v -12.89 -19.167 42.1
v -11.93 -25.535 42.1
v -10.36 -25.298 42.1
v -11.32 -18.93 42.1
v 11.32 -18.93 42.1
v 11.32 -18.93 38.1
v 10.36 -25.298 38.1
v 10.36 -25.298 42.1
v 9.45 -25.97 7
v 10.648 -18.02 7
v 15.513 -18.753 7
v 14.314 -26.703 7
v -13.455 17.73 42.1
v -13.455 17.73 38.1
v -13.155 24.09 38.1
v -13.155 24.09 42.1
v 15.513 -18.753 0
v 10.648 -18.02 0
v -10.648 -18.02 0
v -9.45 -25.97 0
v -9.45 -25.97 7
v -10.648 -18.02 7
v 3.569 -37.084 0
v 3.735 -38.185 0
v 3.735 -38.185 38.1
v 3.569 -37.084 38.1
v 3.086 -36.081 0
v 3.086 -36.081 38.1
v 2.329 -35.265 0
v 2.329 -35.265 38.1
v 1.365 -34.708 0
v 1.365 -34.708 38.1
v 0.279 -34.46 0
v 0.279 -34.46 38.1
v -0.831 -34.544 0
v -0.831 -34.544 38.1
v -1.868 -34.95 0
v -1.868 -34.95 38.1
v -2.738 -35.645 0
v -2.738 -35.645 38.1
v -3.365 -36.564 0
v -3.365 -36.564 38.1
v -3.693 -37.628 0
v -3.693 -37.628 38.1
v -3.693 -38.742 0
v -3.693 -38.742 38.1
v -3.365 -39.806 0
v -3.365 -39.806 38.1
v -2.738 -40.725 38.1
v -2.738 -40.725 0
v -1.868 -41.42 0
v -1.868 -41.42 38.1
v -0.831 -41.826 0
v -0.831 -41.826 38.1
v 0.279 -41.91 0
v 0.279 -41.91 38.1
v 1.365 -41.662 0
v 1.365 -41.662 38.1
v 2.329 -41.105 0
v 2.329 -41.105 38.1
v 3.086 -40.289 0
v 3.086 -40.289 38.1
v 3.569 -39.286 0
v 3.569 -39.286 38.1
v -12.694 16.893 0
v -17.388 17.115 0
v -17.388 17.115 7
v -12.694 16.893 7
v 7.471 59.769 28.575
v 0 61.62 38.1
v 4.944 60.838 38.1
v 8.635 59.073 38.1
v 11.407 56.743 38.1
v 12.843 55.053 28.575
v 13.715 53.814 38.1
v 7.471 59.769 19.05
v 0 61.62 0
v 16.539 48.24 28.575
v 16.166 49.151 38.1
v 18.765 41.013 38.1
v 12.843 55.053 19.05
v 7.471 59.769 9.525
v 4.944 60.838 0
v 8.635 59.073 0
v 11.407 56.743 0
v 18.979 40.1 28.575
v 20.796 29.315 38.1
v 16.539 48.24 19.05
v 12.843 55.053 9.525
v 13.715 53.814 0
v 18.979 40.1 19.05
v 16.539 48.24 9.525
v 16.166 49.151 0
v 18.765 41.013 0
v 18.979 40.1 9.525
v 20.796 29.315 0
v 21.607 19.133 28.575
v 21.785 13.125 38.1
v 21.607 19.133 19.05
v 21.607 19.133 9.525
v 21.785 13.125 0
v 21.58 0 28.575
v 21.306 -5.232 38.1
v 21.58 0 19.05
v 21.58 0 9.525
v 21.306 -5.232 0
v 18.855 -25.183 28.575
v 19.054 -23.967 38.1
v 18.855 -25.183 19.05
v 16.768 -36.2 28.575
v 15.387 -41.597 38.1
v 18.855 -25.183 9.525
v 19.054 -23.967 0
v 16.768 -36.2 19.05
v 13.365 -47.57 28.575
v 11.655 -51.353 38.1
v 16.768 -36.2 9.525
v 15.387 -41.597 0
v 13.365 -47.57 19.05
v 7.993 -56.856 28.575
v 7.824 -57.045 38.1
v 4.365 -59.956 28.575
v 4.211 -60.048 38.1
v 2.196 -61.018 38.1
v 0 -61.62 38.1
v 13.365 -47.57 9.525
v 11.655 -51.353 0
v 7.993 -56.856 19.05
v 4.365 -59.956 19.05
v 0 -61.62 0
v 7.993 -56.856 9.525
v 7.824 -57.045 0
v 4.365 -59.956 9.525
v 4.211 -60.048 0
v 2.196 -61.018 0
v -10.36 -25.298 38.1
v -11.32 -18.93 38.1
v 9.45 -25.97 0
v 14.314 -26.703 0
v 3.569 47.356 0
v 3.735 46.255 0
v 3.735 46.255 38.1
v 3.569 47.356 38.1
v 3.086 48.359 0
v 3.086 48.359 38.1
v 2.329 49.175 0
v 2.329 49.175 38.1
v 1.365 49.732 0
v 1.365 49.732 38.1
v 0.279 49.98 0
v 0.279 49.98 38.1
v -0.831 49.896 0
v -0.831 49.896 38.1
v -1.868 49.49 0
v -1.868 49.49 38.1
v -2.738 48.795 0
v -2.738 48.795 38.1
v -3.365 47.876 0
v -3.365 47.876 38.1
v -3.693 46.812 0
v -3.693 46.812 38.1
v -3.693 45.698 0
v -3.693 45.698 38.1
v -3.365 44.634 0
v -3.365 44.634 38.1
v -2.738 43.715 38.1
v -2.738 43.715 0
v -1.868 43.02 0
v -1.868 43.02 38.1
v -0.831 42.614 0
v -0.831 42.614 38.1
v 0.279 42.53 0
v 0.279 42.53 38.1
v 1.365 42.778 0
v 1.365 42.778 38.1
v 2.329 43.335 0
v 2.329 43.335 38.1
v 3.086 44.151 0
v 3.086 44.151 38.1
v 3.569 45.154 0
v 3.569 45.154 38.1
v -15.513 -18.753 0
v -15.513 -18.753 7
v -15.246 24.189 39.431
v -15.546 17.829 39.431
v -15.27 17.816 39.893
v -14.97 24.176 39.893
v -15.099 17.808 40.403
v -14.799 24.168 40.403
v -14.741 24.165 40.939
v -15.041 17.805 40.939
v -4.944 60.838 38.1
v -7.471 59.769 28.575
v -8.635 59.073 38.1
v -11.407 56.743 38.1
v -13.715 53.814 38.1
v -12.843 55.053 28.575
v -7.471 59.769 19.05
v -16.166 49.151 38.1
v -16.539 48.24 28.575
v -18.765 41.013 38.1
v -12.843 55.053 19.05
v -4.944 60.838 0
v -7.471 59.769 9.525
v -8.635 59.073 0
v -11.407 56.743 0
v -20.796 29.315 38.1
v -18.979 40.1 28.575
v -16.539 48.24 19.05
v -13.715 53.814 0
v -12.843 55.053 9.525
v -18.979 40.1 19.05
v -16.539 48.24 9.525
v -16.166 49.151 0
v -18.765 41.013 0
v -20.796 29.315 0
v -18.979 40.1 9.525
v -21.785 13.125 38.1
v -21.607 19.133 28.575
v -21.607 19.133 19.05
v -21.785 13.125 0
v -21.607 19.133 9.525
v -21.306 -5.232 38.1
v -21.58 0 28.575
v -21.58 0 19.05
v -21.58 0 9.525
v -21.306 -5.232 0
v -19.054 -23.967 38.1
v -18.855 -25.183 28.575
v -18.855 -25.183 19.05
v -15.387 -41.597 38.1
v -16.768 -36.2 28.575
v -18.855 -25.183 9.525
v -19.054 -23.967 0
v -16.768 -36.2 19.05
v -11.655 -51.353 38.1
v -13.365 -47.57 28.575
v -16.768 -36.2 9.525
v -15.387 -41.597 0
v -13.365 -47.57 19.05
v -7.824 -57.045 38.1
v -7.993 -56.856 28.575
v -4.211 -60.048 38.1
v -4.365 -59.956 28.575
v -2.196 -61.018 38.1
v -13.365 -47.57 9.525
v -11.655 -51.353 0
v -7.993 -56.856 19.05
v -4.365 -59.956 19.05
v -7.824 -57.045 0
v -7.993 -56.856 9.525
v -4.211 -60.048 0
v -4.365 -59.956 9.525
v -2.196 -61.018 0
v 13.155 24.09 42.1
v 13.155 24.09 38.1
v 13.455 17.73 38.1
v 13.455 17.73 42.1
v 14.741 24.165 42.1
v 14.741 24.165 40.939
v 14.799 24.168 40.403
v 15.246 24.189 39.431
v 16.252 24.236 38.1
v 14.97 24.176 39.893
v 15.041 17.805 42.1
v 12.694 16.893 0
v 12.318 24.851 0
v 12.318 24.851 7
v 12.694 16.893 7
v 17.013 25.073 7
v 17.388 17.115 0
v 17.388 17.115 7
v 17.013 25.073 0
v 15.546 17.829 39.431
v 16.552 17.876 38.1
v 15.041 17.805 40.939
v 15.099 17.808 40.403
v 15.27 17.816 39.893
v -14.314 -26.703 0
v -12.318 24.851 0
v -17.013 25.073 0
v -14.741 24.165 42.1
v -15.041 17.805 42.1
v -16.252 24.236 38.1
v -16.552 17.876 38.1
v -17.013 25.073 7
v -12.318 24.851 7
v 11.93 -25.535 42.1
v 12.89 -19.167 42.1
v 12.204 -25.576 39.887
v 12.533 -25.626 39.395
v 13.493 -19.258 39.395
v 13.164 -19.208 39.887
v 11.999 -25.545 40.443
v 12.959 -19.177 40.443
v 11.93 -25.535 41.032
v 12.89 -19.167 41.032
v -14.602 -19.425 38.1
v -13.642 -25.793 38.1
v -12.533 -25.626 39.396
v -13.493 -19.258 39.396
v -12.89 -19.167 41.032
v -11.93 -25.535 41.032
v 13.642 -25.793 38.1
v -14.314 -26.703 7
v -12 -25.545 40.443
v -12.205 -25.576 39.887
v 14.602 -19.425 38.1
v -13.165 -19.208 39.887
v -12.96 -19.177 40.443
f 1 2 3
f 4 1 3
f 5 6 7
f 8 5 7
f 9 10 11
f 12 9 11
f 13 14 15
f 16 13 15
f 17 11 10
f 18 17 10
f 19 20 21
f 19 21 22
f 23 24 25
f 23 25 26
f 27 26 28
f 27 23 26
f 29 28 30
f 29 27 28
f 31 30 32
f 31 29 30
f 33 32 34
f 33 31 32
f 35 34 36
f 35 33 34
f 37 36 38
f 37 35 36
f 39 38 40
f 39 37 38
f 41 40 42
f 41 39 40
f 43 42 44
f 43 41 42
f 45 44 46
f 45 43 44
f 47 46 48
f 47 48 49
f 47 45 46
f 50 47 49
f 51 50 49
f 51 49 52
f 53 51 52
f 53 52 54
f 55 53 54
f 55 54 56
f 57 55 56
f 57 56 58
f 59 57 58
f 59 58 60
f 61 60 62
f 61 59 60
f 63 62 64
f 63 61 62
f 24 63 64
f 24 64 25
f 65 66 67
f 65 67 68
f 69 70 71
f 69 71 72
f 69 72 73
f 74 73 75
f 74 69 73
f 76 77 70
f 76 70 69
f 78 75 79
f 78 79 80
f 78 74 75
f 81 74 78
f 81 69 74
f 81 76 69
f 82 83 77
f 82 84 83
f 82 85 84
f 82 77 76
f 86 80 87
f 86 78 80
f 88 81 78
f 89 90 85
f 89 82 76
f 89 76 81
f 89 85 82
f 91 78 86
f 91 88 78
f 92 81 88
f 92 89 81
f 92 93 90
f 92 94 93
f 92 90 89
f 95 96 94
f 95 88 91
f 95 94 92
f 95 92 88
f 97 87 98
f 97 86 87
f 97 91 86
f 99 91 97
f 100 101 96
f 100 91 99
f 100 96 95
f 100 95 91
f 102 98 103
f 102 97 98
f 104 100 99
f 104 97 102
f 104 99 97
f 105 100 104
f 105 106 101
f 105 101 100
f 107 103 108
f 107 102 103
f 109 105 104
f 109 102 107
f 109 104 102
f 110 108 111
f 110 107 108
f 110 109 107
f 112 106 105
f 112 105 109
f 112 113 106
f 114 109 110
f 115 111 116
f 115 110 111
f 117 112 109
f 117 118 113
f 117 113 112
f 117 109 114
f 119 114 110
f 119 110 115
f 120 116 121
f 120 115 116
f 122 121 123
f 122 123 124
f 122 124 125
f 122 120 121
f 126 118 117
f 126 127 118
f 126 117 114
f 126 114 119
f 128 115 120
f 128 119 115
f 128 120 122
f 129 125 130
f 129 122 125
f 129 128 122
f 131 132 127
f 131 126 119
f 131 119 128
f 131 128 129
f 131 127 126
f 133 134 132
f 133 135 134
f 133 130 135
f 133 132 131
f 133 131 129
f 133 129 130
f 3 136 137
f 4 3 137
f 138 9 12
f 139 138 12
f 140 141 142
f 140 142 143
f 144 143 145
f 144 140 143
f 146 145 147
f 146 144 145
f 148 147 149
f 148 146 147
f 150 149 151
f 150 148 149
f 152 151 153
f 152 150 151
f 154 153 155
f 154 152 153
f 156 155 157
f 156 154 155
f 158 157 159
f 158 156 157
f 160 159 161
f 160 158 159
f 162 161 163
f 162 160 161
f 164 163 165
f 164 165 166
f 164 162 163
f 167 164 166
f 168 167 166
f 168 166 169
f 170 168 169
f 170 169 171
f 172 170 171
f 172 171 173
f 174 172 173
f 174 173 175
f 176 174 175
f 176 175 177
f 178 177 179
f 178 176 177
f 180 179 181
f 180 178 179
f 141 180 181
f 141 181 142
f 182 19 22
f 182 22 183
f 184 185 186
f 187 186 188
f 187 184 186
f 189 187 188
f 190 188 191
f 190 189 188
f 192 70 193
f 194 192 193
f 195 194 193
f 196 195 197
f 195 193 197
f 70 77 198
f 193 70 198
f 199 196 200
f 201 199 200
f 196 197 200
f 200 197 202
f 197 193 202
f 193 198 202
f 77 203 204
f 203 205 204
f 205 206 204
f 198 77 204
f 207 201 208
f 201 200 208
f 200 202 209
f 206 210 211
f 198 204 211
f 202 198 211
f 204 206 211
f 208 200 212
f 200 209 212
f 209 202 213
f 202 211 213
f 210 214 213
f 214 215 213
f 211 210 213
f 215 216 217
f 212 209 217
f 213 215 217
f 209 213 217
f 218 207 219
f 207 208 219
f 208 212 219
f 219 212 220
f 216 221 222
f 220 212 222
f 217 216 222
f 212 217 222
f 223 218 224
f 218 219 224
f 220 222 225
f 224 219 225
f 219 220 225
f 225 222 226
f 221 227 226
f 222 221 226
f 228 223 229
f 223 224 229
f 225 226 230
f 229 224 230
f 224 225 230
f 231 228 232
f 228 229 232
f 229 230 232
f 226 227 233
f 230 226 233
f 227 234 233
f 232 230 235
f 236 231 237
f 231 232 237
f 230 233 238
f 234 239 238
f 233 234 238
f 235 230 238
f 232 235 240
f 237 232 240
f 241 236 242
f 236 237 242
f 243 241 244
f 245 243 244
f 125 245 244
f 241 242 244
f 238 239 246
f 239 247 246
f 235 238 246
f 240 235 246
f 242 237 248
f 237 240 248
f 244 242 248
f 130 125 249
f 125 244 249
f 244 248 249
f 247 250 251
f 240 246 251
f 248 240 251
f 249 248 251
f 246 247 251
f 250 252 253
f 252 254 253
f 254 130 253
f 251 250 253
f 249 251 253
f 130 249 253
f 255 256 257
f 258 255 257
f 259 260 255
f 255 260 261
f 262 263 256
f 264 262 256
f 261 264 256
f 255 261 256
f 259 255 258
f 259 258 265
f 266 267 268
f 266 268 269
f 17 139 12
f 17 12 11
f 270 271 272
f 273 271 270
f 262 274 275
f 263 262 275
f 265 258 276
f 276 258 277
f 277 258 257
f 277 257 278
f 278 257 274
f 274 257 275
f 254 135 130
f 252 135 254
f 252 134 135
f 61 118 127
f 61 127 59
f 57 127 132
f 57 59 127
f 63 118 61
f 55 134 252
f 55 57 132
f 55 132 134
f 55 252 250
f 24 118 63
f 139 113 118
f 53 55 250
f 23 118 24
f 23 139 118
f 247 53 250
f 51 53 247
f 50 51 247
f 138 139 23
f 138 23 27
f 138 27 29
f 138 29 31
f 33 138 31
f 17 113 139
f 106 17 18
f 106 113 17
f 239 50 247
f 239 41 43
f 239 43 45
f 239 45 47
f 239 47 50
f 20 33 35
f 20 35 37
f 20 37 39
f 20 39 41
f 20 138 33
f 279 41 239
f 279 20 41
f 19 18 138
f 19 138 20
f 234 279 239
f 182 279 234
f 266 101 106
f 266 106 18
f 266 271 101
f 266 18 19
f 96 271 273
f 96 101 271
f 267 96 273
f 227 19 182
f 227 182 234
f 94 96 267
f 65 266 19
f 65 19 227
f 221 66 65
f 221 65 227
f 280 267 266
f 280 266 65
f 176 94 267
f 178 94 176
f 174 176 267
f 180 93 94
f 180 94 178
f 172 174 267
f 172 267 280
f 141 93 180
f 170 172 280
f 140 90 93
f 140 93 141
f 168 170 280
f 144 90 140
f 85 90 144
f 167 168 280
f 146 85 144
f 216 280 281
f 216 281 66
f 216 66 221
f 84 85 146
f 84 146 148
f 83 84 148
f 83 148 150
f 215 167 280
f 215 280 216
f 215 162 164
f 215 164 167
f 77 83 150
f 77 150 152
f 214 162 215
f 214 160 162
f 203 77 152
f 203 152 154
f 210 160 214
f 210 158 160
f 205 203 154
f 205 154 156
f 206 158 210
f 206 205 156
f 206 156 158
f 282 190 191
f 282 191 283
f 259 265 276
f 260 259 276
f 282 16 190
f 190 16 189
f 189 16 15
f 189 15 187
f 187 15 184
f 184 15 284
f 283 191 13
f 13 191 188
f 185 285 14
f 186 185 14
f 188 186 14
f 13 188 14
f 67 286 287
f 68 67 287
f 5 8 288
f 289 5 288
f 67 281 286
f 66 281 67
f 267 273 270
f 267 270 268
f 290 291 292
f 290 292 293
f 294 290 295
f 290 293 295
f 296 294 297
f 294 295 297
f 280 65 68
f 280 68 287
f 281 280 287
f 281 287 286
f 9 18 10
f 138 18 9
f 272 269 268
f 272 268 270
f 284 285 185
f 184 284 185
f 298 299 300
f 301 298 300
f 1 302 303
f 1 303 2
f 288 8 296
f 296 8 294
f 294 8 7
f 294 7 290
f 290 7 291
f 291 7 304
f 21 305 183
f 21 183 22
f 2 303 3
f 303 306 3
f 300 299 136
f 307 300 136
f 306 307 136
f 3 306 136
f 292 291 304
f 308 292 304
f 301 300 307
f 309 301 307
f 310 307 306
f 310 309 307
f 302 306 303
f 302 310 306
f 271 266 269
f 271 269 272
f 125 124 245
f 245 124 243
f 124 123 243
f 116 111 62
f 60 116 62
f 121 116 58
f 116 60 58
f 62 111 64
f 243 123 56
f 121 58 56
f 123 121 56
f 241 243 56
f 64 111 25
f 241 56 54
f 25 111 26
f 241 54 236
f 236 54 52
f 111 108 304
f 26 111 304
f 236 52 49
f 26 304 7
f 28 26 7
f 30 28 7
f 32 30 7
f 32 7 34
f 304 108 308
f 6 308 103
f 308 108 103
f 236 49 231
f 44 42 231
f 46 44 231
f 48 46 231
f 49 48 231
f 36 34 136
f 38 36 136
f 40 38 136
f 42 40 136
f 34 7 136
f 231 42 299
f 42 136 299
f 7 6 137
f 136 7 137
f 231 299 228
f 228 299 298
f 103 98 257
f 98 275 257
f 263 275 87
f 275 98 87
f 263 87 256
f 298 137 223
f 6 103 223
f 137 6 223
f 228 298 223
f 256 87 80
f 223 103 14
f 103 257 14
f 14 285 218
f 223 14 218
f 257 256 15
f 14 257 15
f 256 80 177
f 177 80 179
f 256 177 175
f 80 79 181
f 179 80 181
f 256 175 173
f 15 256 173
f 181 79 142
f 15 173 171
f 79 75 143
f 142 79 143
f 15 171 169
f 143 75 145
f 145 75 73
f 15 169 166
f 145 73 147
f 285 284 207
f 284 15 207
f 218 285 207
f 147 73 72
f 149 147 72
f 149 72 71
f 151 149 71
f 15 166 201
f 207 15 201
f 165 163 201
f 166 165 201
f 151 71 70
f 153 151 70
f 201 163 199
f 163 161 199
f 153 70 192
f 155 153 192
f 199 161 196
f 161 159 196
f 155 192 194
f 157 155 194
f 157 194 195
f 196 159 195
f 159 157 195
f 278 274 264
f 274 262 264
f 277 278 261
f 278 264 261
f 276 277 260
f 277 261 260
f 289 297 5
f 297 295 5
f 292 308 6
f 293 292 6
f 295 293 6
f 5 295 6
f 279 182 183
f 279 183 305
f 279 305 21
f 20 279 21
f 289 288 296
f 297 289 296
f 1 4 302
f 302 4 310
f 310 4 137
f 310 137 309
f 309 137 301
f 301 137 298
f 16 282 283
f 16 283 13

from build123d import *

# Parameters (mm, degrees)
F1_R      = 3.735
F2_DEPTH  = 38.1
F4_DEPTH  = 4
F6_DEPTH  = 6.44
F8_DEPTH  = 6.3670715404
F10_DEPTH = 6.3670715404
F12_DEPTH = 6.44
F13_R     = 2.5
F14_DEPTH = 7


# Not quite as in the source:
# - a feature names something its author has since deleted; it is built from what else it names


with BuildPart() as f2:
    # F1 (on Top) → F2 (new body)
    with BuildSketch(Plane.XY):
        with BuildLine():
            add(Edge.make_bspline(
                [(0, 61.62), (11.5485272162, 61.4039385019), (22.0841192578, 39.7713639929), (22.0172478155, -1.3215032222), (19.7727052767, -22.1995102033), (12.6960353016, -59.3664700438), (0, -61.62)],
                knots=[0, 0, 0, 0, 0.2315513491, 0.5055689387, 0.7231235988, 1, 1, 1, 1], degree=3))
            add(Edge.make_bspline(
                [(0, 61.62), (-11.5485272162, 61.4039385019), (-22.0841192578, 39.7713639929), (-22.0172478155, -1.3215032222), (-19.7727052767, -22.1995102033), (-12.6960353016, -59.3664700438), (0, -61.62)],
                knots=[0, 0, 0, 0, 0.2315513491, 0.5055689387, 0.7231235988, 1, 1, 1, 1], degree=3))
        make_face()
        Polygon((-14.3142142012, -26.7031931663), (-15.512723518, -18.7530249028), (-10.6481931396, -18.0196838229), (-9.4496838229, -25.9698520863), align=None, mode=Mode.SUBTRACT)
        with Locations((0, -38.185)):
            Circle(F1_R, mode=Mode.SUBTRACT)
        Polygon((9.4496838229, -25.9698520863), (10.6481931396, -18.0196838229), (15.512723518, -18.7530249028), (14.3142142012, -26.7031931663), align=None, mode=Mode.SUBTRACT)
        Polygon((-17.3883624322, 17.1146464619), (-17.0129745562, 25.0728694338), (-12.318194576, 24.851417548), (-12.693582452, 16.893194576), align=None, mode=Mode.SUBTRACT)
        Polygon((17.3883624322, 17.1146464619), (12.693582452, 16.893194576), (12.318194576, 24.851417548), (17.0129745562, 25.0728694338), align=None, mode=Mode.SUBTRACT)
        with Locations((0, 46.255)):
            Circle(F1_R, mode=Mode.SUBTRACT)
        Polygon((15.512723518, -18.7530249028), (10.6481931396, -18.0196838229), (9.4496838229, -25.9698520863), (14.3142142012, -26.7031931663), align=None)
        Polygon((10.36, -25.298045226), (11.32, -18.93), (14.6024073408, -19.4248317632), (13.6424073408, -25.7928769892), align=None, mode=Mode.SUBTRACT)
        Polygon((-10.6481931396, -18.0196838229), (-15.512723518, -18.7530249028), (-14.3142142012, -26.7031931663), (-9.4496838229, -25.9698520863), align=None)
        Polygon((-14.6024073408, -19.4248317632), (-11.32, -18.93), (-10.36, -25.298045226), (-13.6424073408, -25.7928769892), align=None, mode=Mode.SUBTRACT)
        Polygon((-12.318194576, 24.851417548), (-17.0129745562, 25.0728694338), (-17.3883624322, 17.1146464619), (-12.693582452, 16.893194576), align=None)
        Polygon((-13.155, 24.09), (-13.455, 17.73), (-16.5515570082, 17.8760640098), (-16.2515570082, 24.2360640098), align=None, mode=Mode.SUBTRACT)
        Polygon((12.318194576, 24.851417548), (12.693582452, 16.893194576), (17.3883624322, 17.1146464619), (17.0129745562, 25.0728694338), align=None)
        Polygon((16.5515570082, 17.8760640098), (13.455, 17.73), (13.155, 24.09), (16.2515570082, 24.2360640098), align=None, mode=Mode.SUBTRACT)
        Polygon((14.6024073408, -19.4248317632), (11.32, -18.93), (10.36, -25.298045226), (13.6424073408, -25.7928769892), align=None)
        Polygon((-10.36, -25.298045226), (-11.32, -18.93), (-14.6024073408, -19.4248317632), (-13.6424073408, -25.7928769892), align=None)
        Polygon((-16.5515570082, 17.8760640098), (-13.455, 17.73), (-13.155, 24.09), (-16.2515570082, 24.2360640098), align=None)
        Polygon((13.155, 24.09), (13.455, 17.73), (16.5515570082, 17.8760640098), (16.2515570082, 24.2360640098), align=None)
    extrude(amount=F2_DEPTH)

    # F3 (on face) → F4 (join)
    with BuildSketch(Plane.XY.offset(38.1)):
        Polygon((-10.36, -25.298045226), (-11.32, -18.93), (-14.6024073408, -19.4248317632), (-13.6424073408, -25.7928769892), align=None)
        Polygon((14.6024073408, -19.4248317632), (11.32, -18.93), (10.36, -25.298045226), (13.6424073408, -25.7928769892), align=None)
        Polygon((13.155, 24.09), (13.455, 17.73), (16.5515570082, 17.8760640098), (16.2515570082, 24.2360640098), align=None)
        Polygon((-16.5515570082, 17.8760640098), (-13.455, 17.73), (-13.155, 24.09), (-16.2515570082, 24.2360640098), align=None)
    extrude(amount=F4_DEPTH)

    # F5 (on face) → F6 (cut, through all)
    with BuildSketch(Plane(origin=(3.4987885373, -23.2087954603, 0), x_dir=(0.9888268984, 0.149068323, 0), z_dir=(0.149068323, -0.9888268984, 0))):
        Polygon((-17.3348802558, 42.1), (-17.3348802558, 38.1), (-15.6033838444, 40.1), (-15.6033838444, 42.1), align=None)
    extrude(amount=-F6_DEPTH, mode=Mode.SUBTRACT)

    # F7 (on face) → F8 (cut, through all)
    with BuildSketch(Plane(origin=(0.8045932866, 17.0573776752, 0), x_dir=(0.9988893575, -0.0471174225, 0), z_dir=(-0.0471174225, -0.9988893575, 0))):
        Polygon((-15.8629482063, 40.1), (-15.8629482063, 42.1), (-17.3754482063, 42.1), (-17.3754482063, 38.1), align=None)
    extrude(amount=-F8_DEPTH, mode=Mode.SUBTRACT)

    # F9 (on face) → F10 (cut, through all)
    with BuildSketch(Plane(origin=(-0.8045932866, 17.0573776752, 0), x_dir=(0.9988893575, 0.0471174225, 0), z_dir=(0.0471174225, -0.9988893575, 0))):
        Polygon((15.8629482063, 42.1), (15.8629482063, 40.1), (17.3754482063, 38.1), (17.3754482063, 42.1), align=None)
    extrude(amount=-F10_DEPTH, mode=Mode.SUBTRACT)

    # F11 (on face) → F12 (cut, through all)
    with BuildSketch(Plane(origin=(-3.4987885373, -23.2087954603, 0), x_dir=(0.9888268984, -0.149068323, 0), z_dir=(-0.149068323, -0.9888268984, 0))):
        Polygon((17.3348802558, 42.1), (15.6028838444, 42.1), (15.6028838444, 40.1), (17.3348802558, 38.1), align=None)
    extrude(amount=-F12_DEPTH, mode=Mode.SUBTRACT)

    # F13
    f13_edges = [f2.edges().sort_by_distance(p)[0] for p in [
        (12.409763, -22.350669, 40.1),
        (14.890737, 20.984799, 40.1),
        (-14.890737, 20.984799, 40.1),
        (-12.410257, -22.350743, 40.1),
    ]]
    fillet(f13_edges, radius=F13_R)

    # F1 (on Top) → F14 (cut)
    with BuildSketch(Plane.XY):
        Polygon((15.512723518, -18.7530249028), (10.6481931396, -18.0196838229), (9.4496838229, -25.9698520863), (14.3142142012, -26.7031931663), align=None)
        Polygon((10.36, -25.298045226), (11.32, -18.93), (14.6024073408, -19.4248317632), (13.6424073408, -25.7928769892), align=None, mode=Mode.SUBTRACT)
        Polygon((-10.6481931396, -18.0196838229), (-15.512723518, -18.7530249028), (-14.3142142012, -26.7031931663), (-9.4496838229, -25.9698520863), align=None)
        Polygon((-14.6024073408, -19.4248317632), (-11.32, -18.93), (-10.36, -25.298045226), (-13.6424073408, -25.7928769892), align=None, mode=Mode.SUBTRACT)
        Polygon((12.318194576, 24.851417548), (12.693582452, 16.893194576), (17.3883624322, 17.1146464619), (17.0129745562, 25.0728694338), align=None)
        Polygon((16.5515570082, 17.8760640098), (13.455, 17.73), (13.155, 24.09), (16.2515570082, 24.2360640098), align=None, mode=Mode.SUBTRACT)
        Polygon((-12.318194576, 24.851417548), (-17.0129745562, 25.0728694338), (-17.3883624322, 17.1146464619), (-12.693582452, 16.893194576), align=None)
        Polygon((-13.155, 24.09), (-13.455, 17.73), (-16.5515570082, 17.8760640098), (-16.2515570082, 24.2360640098), align=None, mode=Mode.SUBTRACT)
        Polygon((-10.36, -25.298045226), (-11.32, -18.93), (-14.6024073408, -19.4248317632), (-13.6424073408, -25.7928769892), align=None)
        Polygon((14.6024073408, -19.4248317632), (11.32, -18.93), (10.36, -25.298045226), (13.6424073408, -25.7928769892), align=None)
        Polygon((13.155, 24.09), (13.455, 17.73), (16.5515570082, 17.8760640098), (16.2515570082, 24.2360640098), align=None)
        Polygon((-16.5515570082, 17.8760640098), (-13.455, 17.73), (-13.155, 24.09), (-16.2515570082, 24.2360640098), align=None)
    extrude(amount=F14_DEPTH, mode=Mode.SUBTRACT)


solid = f2.part
